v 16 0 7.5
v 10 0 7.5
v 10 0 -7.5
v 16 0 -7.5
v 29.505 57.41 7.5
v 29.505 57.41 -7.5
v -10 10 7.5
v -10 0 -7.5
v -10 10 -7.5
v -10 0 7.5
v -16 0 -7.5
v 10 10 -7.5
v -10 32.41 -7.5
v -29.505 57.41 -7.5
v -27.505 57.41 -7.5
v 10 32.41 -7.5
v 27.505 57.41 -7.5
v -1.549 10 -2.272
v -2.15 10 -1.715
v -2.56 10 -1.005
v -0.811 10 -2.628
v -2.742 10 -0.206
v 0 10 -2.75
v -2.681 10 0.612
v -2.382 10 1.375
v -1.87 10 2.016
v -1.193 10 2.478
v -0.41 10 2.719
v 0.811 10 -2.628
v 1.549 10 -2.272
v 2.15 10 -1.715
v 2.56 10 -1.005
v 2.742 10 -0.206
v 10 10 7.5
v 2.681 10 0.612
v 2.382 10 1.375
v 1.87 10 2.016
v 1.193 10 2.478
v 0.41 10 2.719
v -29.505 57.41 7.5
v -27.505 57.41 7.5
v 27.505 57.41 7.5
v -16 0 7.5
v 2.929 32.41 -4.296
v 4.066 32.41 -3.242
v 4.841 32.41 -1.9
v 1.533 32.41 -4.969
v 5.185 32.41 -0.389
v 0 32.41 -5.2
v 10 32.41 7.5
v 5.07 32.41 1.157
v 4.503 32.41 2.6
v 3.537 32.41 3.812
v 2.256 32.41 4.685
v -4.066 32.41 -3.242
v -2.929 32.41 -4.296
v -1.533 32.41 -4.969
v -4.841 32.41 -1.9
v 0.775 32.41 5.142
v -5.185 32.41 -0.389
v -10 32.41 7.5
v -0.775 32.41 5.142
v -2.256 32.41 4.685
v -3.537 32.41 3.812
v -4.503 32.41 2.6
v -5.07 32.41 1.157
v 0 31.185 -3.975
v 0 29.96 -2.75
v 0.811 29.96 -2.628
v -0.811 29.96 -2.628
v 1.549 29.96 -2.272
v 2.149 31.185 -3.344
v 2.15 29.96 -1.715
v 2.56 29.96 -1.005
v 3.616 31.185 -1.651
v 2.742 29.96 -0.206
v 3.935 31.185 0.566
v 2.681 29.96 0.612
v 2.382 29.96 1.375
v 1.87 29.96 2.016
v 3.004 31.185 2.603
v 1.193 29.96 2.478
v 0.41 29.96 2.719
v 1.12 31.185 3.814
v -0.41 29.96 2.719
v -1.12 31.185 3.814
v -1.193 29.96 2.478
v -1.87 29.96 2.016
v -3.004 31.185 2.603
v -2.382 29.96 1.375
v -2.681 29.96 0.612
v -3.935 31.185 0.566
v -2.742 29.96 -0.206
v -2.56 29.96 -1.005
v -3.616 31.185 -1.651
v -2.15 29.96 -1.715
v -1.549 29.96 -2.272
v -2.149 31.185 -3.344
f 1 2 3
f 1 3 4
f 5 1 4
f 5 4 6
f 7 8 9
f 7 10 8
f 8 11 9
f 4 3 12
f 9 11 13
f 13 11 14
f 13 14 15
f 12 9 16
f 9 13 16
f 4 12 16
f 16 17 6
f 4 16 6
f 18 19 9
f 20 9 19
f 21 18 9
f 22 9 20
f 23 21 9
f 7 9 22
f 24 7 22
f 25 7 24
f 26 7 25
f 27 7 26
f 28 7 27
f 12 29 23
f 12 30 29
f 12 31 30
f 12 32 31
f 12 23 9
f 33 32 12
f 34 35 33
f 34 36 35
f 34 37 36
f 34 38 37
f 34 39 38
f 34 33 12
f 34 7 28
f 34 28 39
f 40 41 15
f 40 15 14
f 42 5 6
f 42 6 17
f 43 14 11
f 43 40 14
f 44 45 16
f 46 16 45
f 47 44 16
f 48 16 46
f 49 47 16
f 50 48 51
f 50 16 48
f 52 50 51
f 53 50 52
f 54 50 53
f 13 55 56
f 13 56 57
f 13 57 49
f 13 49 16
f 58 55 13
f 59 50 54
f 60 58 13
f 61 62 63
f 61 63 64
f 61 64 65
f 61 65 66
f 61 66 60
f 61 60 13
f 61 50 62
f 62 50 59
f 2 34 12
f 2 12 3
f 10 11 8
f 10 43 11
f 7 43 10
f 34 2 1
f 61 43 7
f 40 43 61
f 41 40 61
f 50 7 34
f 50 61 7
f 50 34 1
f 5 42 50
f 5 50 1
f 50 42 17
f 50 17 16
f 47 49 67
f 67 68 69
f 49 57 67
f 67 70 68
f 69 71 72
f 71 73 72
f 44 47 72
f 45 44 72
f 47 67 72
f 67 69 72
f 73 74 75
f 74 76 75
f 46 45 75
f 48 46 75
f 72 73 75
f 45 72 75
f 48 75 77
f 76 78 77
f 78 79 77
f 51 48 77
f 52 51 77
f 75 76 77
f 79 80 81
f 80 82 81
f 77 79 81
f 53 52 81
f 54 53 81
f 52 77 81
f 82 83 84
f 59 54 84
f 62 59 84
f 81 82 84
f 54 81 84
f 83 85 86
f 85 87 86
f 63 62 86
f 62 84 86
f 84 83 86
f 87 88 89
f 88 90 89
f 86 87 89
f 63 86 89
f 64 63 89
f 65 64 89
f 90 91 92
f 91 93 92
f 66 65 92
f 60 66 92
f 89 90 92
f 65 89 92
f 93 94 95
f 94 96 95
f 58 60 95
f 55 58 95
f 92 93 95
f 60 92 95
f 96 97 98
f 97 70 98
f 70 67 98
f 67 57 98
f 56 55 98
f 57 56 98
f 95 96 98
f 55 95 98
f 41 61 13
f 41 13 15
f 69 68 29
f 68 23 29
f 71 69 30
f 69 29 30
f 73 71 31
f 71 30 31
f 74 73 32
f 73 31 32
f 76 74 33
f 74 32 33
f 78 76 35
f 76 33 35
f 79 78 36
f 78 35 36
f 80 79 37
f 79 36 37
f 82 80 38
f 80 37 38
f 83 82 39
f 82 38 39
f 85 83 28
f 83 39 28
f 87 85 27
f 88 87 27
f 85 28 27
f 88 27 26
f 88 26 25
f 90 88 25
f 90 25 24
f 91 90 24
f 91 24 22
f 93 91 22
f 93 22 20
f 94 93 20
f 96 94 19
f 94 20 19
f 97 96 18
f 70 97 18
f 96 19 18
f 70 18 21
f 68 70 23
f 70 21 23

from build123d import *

# Parameters (mm, degrees)
EXTRUDE_1_DEPTH             = 7.5
HOLE_WIZARD_M51_D           = 5.5
HOLE_WIZARD_M51_CSINK_D     = 10.4
HOLE_WIZARD_M51_CSINK_ANGLE = 90


with BuildPart() as part:
    # Эскиз1 → Бобышка-Вытянуть1 (new, symmetric)
    with BuildSketch(Plane.XY):
        Polygon((-10, 0), (-10, 10), (10, 10), (10, 0), (16, 0), (29.505188455, 57.41043399), (27.505188455, 57.41043399), (10, 32.41043399), (-10, 32.41043399), (-27.505188455, 57.41043399), (-29.505188455, 57.41043399), (-16, 0), align=None)
    extrude(amount=EXTRUDE_1_DEPTH, both=True)

    # Зенковка для  винта с плоской головкой M51 (through all)
    with Locations(Plane.ZX.offset(32.41043399)):
        with Locations((0, 0)):
            CounterSinkHole(HOLE_WIZARD_M51_D / 2, HOLE_WIZARD_M51_CSINK_D / 2, counter_sink_angle=HOLE_WIZARD_M51_CSINK_ANGLE)


solid = part.part
